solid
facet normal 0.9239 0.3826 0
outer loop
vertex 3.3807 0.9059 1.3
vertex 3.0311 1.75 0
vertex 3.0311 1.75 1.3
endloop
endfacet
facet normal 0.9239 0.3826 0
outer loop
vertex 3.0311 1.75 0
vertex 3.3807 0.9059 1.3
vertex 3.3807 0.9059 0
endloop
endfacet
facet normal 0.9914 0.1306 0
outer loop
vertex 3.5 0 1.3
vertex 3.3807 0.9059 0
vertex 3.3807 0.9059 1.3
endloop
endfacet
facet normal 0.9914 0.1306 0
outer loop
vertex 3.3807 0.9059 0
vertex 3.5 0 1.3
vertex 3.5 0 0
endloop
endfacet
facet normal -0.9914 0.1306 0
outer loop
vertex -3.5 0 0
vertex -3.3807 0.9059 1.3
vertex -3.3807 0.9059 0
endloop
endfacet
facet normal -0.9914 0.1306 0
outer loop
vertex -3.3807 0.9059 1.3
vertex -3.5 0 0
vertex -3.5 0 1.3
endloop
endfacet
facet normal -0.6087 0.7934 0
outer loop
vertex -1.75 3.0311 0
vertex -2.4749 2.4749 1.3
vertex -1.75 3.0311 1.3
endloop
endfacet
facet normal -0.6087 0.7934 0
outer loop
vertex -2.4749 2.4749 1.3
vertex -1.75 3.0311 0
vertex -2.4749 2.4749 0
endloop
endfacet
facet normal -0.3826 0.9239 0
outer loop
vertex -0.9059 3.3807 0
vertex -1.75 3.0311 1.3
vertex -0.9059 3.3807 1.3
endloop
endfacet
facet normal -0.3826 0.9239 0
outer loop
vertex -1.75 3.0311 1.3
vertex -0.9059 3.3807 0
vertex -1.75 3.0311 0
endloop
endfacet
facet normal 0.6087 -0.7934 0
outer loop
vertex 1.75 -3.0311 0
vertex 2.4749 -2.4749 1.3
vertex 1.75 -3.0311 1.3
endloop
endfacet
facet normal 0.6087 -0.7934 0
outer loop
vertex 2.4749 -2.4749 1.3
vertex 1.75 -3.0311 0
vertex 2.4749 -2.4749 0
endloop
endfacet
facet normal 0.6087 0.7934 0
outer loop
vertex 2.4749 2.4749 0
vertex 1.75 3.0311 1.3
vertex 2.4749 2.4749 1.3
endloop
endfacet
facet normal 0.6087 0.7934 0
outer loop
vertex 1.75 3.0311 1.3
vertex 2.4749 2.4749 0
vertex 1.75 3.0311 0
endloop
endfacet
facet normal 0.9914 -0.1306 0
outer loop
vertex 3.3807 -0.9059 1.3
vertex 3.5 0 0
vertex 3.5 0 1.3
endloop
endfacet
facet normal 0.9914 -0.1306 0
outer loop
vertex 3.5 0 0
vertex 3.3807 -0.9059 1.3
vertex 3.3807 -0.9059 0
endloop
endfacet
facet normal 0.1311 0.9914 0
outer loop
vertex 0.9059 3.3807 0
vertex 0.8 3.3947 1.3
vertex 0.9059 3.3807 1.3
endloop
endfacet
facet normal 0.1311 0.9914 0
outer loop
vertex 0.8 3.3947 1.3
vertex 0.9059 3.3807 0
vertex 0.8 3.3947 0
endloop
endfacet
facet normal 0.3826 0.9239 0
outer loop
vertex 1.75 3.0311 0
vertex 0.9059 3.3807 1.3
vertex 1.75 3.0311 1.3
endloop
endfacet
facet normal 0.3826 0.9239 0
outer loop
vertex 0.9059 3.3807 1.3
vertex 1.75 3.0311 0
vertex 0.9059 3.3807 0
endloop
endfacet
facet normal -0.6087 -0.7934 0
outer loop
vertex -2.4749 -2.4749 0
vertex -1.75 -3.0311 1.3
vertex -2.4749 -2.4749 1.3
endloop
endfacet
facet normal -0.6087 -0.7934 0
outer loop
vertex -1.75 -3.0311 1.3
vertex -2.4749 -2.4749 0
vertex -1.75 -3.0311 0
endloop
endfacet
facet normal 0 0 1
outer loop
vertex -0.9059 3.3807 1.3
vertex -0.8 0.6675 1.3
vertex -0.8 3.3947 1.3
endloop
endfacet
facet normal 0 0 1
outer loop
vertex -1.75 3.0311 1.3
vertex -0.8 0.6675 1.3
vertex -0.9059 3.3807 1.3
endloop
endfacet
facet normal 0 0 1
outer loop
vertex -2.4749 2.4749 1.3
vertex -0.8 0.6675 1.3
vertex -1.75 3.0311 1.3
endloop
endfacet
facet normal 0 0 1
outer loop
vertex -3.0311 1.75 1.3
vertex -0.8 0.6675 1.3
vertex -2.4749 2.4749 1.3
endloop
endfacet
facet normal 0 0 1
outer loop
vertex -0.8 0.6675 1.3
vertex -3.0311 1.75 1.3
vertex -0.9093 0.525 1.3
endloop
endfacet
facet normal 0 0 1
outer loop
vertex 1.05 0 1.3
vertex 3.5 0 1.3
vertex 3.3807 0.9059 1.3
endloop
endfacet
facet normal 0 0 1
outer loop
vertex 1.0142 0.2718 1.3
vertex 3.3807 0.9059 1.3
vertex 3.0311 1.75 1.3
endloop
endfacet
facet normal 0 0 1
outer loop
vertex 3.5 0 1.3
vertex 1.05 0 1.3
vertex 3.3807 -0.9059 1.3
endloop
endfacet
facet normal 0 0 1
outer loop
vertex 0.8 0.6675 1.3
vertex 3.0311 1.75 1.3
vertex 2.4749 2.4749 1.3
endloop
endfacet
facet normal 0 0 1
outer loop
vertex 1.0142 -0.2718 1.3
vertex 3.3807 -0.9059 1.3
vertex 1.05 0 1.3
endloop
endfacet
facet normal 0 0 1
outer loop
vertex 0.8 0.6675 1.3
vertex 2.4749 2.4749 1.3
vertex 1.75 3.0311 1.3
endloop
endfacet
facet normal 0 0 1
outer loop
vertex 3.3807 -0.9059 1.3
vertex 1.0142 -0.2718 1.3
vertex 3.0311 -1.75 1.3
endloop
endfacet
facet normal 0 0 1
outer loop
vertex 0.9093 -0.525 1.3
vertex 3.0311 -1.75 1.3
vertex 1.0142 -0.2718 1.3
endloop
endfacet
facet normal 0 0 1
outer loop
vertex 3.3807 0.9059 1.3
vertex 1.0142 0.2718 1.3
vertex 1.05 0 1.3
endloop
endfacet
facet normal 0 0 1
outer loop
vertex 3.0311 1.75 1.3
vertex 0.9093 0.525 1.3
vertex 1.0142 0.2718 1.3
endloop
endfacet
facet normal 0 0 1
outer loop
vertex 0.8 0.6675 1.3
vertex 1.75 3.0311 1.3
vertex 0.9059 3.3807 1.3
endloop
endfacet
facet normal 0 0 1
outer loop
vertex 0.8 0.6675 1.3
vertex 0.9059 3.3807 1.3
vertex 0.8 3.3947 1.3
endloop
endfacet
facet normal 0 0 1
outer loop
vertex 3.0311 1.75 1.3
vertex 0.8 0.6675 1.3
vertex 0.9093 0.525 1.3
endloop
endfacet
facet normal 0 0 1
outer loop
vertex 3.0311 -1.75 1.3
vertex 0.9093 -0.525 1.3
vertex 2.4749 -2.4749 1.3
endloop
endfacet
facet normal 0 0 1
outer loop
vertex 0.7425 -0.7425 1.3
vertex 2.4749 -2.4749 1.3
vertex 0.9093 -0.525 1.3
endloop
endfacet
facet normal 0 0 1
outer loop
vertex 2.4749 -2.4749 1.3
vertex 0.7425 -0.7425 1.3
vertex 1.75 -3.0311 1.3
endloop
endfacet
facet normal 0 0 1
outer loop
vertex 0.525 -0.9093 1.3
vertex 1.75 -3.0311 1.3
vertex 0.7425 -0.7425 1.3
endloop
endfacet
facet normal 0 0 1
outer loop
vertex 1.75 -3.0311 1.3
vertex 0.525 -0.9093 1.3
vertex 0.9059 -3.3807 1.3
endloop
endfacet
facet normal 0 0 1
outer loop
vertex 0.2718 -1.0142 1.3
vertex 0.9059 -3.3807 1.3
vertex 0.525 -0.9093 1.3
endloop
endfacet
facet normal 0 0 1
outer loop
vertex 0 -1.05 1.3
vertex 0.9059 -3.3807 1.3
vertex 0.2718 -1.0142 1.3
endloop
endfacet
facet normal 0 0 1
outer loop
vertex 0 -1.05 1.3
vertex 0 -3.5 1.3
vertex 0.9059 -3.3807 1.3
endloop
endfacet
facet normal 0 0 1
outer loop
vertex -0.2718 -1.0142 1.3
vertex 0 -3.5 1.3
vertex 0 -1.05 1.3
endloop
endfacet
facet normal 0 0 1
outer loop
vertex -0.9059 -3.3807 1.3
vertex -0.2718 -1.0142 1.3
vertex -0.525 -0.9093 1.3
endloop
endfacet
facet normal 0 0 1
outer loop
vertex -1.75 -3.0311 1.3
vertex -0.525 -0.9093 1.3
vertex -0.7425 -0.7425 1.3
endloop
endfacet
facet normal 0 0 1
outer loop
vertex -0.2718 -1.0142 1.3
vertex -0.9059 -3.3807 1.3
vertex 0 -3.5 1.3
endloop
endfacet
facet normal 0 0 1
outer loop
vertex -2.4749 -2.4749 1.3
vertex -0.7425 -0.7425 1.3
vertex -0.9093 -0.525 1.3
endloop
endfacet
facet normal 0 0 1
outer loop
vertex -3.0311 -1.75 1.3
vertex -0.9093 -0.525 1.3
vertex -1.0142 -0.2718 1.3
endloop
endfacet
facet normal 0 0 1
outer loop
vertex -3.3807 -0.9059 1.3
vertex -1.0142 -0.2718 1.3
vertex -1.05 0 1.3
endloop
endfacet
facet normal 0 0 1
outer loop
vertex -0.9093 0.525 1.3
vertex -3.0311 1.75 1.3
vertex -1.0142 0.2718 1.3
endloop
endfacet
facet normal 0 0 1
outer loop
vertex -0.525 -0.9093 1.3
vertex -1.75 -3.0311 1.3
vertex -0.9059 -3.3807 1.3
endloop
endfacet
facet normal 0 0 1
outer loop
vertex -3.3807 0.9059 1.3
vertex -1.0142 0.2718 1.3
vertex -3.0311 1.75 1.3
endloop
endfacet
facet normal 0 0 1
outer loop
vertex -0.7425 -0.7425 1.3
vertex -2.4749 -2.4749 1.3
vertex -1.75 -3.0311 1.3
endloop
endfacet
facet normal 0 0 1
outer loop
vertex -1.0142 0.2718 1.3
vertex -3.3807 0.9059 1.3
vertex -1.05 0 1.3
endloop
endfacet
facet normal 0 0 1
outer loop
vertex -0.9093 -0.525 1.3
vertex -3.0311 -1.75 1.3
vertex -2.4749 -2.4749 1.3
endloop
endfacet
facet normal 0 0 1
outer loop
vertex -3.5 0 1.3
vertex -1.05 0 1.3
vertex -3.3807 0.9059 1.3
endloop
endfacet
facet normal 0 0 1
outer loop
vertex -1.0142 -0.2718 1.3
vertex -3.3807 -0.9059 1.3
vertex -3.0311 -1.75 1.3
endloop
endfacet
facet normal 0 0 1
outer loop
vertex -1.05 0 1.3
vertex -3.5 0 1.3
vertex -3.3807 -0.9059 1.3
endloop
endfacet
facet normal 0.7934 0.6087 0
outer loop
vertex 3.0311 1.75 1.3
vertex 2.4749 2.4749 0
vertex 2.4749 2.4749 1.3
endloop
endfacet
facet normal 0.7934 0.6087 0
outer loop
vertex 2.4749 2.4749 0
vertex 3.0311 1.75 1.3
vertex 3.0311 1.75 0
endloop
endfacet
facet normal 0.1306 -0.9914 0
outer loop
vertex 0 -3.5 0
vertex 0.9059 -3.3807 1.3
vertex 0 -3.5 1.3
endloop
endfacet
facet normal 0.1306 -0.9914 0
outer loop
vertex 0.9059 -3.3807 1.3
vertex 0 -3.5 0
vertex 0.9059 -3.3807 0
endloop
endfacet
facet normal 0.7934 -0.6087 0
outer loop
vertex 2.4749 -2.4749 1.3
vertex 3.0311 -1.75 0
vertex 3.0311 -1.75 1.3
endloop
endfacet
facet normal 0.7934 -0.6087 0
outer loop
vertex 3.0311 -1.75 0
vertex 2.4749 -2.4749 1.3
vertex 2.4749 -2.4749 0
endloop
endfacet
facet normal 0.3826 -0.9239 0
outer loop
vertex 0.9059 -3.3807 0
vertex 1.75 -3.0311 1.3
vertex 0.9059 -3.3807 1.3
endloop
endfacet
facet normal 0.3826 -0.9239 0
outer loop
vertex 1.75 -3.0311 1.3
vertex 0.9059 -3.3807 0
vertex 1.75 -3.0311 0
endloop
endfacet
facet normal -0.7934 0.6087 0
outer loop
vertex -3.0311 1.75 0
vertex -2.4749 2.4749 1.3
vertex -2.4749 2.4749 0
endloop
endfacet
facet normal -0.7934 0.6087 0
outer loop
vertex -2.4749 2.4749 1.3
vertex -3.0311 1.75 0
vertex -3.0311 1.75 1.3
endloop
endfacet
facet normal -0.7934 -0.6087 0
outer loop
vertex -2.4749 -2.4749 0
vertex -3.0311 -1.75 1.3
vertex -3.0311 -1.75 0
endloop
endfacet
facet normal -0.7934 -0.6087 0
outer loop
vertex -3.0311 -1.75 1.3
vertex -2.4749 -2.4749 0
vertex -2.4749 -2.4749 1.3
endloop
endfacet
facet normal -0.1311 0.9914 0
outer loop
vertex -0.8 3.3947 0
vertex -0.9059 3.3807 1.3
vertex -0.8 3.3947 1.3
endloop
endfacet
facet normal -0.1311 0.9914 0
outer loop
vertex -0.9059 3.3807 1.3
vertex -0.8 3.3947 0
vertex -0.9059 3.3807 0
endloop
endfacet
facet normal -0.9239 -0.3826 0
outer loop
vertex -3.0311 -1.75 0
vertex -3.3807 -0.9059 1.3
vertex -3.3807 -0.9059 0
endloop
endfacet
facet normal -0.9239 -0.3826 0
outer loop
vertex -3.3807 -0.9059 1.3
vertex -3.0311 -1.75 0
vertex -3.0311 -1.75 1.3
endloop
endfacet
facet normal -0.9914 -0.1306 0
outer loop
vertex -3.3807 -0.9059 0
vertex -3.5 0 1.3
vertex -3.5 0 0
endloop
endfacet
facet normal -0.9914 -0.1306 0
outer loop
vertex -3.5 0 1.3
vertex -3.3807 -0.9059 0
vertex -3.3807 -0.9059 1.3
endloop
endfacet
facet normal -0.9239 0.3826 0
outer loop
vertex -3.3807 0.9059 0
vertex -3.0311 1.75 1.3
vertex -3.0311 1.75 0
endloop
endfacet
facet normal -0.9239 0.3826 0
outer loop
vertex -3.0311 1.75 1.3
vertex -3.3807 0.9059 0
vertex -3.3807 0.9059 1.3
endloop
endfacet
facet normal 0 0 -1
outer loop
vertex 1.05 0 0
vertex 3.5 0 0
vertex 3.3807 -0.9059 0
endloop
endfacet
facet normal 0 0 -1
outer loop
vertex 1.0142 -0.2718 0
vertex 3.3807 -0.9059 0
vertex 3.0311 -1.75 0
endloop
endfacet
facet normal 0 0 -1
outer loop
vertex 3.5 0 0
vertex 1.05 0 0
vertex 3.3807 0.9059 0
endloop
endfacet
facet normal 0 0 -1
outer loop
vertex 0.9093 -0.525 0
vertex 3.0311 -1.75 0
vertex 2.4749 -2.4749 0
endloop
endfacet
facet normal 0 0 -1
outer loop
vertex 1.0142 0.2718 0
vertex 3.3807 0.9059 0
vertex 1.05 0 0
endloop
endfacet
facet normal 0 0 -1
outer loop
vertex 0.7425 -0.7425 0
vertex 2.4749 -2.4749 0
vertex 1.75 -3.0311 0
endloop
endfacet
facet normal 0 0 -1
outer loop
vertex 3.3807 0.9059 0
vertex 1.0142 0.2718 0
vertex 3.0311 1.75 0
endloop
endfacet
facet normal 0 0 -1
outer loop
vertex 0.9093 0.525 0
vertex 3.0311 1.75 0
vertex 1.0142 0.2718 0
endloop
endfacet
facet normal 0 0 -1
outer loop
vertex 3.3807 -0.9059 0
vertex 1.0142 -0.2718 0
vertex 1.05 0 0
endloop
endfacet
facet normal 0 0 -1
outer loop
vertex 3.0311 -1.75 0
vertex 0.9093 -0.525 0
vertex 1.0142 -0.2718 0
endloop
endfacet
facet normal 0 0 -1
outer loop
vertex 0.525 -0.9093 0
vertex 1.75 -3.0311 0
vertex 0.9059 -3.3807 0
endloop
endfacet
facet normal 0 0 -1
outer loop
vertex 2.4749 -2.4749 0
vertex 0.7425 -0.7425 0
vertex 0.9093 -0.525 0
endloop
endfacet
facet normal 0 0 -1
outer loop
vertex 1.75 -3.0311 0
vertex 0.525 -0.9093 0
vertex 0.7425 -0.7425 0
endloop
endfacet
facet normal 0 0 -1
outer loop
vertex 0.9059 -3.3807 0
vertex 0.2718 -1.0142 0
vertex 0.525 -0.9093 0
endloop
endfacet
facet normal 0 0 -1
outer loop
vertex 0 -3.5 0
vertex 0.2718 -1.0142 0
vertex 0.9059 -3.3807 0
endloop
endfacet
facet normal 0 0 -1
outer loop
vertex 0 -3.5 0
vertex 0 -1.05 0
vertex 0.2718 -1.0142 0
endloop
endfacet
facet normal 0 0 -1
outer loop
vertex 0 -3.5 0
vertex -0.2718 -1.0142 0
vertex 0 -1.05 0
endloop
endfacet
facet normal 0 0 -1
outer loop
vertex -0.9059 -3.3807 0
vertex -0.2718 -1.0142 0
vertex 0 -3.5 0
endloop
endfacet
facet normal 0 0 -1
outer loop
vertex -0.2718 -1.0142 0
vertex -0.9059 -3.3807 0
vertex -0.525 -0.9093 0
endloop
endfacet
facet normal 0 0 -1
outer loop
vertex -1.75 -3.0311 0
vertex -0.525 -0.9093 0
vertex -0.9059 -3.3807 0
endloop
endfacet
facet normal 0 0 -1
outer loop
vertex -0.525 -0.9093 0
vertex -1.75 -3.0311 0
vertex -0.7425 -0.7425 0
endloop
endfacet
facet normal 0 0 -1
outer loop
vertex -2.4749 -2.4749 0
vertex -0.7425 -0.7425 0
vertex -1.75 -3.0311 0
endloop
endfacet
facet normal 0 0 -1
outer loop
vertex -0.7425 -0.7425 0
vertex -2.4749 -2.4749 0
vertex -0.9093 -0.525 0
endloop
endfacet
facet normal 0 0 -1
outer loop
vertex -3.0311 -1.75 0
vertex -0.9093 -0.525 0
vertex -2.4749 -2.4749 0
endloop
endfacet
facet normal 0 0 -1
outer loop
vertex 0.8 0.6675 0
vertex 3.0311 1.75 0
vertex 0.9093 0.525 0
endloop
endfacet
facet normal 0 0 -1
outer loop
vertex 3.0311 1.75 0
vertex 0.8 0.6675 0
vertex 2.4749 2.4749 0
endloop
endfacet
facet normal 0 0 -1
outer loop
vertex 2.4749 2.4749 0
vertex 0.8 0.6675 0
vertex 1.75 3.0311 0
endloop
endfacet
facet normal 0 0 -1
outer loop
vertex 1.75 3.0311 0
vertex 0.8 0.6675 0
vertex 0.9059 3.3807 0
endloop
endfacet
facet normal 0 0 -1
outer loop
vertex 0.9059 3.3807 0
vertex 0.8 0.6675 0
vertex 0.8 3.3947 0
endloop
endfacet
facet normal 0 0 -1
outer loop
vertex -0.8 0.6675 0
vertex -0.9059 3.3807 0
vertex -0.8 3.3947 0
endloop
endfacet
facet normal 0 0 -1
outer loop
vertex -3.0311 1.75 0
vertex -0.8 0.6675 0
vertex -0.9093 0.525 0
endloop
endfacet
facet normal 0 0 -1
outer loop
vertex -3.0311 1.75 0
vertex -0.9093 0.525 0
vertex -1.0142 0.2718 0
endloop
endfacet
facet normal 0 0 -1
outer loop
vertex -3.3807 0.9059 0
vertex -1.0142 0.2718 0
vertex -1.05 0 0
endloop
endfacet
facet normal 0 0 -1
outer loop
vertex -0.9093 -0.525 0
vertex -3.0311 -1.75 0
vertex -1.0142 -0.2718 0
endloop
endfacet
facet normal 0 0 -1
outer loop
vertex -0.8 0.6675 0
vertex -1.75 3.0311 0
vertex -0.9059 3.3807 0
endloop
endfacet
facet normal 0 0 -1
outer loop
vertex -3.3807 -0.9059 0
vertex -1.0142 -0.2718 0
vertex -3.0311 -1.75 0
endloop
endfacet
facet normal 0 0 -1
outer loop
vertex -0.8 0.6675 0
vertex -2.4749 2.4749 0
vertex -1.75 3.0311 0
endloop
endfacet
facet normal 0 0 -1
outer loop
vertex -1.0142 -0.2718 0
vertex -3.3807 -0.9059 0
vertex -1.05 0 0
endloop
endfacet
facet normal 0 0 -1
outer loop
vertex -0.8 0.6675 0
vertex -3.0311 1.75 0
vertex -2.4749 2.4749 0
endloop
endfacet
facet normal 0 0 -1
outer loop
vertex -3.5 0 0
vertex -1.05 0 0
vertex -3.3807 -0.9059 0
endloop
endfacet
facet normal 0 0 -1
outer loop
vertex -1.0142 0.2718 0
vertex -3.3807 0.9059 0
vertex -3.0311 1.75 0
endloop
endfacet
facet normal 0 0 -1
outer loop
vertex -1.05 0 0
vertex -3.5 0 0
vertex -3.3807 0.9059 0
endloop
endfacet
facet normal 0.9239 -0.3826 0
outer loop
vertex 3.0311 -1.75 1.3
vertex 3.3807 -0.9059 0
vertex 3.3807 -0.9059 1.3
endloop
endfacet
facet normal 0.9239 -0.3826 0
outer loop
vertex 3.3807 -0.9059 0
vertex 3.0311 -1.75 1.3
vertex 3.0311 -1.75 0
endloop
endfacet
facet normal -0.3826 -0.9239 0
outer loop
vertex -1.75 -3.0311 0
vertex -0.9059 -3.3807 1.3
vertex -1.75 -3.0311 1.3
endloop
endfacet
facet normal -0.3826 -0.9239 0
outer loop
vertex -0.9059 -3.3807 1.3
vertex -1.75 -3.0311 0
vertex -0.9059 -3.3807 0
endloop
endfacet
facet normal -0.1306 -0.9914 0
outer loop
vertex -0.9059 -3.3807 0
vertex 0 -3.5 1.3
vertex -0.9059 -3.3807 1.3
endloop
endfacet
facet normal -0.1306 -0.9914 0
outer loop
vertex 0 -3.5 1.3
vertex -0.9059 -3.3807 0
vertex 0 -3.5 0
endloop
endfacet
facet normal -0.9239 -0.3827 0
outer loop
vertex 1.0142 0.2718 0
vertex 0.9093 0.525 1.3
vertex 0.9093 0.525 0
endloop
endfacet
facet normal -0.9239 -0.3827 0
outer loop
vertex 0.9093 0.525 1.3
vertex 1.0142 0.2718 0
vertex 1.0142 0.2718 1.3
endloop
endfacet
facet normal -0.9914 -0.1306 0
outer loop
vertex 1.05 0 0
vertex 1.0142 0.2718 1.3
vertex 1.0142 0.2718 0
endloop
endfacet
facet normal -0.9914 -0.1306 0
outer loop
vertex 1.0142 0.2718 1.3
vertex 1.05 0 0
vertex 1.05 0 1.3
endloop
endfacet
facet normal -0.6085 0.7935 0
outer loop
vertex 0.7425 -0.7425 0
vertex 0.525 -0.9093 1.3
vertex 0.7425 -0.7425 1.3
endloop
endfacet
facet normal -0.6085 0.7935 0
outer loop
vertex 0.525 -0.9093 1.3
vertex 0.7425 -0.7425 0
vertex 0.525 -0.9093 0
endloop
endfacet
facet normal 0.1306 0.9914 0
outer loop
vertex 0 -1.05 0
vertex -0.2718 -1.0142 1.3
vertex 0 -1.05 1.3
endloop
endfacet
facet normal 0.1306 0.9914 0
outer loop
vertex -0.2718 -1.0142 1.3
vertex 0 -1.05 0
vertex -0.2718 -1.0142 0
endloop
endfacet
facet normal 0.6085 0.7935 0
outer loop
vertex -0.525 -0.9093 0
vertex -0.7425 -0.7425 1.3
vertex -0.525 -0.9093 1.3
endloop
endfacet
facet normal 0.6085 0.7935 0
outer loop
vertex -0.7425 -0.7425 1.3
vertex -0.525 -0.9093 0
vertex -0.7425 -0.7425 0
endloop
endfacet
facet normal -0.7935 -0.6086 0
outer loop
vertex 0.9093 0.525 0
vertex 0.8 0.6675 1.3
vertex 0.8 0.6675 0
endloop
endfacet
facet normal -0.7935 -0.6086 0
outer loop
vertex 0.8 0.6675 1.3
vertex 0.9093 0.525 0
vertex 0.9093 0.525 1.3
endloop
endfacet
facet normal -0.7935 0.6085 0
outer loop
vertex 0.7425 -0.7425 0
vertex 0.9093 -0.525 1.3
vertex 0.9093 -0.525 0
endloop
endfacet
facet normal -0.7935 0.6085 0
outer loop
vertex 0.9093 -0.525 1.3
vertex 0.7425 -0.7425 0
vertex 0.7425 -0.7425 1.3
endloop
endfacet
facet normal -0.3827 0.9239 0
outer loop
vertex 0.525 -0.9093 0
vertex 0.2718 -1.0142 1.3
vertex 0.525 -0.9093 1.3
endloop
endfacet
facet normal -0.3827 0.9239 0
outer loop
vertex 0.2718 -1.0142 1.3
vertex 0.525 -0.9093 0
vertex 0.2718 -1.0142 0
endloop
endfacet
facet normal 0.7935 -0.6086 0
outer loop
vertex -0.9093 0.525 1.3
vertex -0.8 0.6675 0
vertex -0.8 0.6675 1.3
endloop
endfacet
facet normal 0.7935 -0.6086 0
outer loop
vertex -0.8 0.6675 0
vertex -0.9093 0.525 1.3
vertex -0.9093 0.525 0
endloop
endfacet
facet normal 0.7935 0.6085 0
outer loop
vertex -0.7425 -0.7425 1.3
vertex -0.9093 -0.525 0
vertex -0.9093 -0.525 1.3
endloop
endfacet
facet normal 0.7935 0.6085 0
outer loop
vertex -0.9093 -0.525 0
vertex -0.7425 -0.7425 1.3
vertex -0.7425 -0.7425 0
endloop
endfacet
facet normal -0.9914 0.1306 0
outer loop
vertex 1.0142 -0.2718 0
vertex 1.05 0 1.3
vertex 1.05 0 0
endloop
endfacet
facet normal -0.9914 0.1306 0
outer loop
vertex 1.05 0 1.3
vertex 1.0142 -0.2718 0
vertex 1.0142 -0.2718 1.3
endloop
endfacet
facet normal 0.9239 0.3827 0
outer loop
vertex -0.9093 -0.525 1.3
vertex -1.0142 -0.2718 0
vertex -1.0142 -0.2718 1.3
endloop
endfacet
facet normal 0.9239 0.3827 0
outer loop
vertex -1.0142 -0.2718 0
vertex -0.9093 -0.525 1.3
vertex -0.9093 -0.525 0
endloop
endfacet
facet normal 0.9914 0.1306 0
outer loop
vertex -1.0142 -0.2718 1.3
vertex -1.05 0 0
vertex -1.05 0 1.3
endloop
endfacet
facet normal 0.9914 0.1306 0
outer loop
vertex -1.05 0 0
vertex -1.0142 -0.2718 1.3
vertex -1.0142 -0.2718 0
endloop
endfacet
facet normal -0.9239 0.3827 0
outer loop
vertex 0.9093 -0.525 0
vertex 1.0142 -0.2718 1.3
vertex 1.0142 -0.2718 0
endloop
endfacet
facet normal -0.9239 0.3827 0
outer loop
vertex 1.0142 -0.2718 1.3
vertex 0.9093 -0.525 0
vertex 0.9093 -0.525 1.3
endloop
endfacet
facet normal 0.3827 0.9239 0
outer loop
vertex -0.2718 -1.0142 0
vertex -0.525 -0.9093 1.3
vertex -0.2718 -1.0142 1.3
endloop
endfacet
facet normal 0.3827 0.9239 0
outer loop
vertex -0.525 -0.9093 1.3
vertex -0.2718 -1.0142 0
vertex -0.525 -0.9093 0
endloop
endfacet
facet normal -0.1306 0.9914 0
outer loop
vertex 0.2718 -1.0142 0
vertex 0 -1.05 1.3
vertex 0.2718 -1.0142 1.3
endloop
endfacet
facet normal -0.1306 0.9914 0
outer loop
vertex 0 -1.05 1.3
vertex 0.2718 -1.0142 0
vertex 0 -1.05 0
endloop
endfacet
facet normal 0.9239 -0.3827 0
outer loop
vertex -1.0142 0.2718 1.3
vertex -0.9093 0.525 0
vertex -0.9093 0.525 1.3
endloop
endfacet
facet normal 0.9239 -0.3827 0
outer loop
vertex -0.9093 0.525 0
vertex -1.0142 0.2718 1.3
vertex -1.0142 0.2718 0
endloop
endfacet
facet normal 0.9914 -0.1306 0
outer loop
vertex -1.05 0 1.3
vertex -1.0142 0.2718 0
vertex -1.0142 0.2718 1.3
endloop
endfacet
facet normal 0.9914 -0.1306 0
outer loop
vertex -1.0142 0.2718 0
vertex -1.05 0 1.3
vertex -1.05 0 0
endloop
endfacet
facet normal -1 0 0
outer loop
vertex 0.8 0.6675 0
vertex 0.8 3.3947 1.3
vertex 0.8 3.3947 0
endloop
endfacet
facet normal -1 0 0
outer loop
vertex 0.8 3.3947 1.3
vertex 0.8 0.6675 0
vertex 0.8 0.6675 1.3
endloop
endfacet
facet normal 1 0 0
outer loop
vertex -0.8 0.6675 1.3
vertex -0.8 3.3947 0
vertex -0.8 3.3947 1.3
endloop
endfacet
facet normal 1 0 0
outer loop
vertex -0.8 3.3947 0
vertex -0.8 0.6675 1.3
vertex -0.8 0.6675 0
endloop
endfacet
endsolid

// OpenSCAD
$fn=24;

module clip(od,id,t,ow){
  difference(){
    difference(){
      cylinder(d=od,h=t);
      translate([0,0,-0.1]) cylinder(d=id,h=t+0.2);
    }
    translate([-ow/2,0,-0.2]) cube([ow,od/2+1,t+0.4]);
  }
}

// V70 v4 lead-nut retaining-pin clip.
// Reference topology: V50 plate-retainer clip.
// Target groove Ø2.40; relaxed ID Ø2.10; opening 1.60.
// Outer diameter widened to Ø7.00 for stronger arms.
clip(7.00,2.10,1.30,1.60);
